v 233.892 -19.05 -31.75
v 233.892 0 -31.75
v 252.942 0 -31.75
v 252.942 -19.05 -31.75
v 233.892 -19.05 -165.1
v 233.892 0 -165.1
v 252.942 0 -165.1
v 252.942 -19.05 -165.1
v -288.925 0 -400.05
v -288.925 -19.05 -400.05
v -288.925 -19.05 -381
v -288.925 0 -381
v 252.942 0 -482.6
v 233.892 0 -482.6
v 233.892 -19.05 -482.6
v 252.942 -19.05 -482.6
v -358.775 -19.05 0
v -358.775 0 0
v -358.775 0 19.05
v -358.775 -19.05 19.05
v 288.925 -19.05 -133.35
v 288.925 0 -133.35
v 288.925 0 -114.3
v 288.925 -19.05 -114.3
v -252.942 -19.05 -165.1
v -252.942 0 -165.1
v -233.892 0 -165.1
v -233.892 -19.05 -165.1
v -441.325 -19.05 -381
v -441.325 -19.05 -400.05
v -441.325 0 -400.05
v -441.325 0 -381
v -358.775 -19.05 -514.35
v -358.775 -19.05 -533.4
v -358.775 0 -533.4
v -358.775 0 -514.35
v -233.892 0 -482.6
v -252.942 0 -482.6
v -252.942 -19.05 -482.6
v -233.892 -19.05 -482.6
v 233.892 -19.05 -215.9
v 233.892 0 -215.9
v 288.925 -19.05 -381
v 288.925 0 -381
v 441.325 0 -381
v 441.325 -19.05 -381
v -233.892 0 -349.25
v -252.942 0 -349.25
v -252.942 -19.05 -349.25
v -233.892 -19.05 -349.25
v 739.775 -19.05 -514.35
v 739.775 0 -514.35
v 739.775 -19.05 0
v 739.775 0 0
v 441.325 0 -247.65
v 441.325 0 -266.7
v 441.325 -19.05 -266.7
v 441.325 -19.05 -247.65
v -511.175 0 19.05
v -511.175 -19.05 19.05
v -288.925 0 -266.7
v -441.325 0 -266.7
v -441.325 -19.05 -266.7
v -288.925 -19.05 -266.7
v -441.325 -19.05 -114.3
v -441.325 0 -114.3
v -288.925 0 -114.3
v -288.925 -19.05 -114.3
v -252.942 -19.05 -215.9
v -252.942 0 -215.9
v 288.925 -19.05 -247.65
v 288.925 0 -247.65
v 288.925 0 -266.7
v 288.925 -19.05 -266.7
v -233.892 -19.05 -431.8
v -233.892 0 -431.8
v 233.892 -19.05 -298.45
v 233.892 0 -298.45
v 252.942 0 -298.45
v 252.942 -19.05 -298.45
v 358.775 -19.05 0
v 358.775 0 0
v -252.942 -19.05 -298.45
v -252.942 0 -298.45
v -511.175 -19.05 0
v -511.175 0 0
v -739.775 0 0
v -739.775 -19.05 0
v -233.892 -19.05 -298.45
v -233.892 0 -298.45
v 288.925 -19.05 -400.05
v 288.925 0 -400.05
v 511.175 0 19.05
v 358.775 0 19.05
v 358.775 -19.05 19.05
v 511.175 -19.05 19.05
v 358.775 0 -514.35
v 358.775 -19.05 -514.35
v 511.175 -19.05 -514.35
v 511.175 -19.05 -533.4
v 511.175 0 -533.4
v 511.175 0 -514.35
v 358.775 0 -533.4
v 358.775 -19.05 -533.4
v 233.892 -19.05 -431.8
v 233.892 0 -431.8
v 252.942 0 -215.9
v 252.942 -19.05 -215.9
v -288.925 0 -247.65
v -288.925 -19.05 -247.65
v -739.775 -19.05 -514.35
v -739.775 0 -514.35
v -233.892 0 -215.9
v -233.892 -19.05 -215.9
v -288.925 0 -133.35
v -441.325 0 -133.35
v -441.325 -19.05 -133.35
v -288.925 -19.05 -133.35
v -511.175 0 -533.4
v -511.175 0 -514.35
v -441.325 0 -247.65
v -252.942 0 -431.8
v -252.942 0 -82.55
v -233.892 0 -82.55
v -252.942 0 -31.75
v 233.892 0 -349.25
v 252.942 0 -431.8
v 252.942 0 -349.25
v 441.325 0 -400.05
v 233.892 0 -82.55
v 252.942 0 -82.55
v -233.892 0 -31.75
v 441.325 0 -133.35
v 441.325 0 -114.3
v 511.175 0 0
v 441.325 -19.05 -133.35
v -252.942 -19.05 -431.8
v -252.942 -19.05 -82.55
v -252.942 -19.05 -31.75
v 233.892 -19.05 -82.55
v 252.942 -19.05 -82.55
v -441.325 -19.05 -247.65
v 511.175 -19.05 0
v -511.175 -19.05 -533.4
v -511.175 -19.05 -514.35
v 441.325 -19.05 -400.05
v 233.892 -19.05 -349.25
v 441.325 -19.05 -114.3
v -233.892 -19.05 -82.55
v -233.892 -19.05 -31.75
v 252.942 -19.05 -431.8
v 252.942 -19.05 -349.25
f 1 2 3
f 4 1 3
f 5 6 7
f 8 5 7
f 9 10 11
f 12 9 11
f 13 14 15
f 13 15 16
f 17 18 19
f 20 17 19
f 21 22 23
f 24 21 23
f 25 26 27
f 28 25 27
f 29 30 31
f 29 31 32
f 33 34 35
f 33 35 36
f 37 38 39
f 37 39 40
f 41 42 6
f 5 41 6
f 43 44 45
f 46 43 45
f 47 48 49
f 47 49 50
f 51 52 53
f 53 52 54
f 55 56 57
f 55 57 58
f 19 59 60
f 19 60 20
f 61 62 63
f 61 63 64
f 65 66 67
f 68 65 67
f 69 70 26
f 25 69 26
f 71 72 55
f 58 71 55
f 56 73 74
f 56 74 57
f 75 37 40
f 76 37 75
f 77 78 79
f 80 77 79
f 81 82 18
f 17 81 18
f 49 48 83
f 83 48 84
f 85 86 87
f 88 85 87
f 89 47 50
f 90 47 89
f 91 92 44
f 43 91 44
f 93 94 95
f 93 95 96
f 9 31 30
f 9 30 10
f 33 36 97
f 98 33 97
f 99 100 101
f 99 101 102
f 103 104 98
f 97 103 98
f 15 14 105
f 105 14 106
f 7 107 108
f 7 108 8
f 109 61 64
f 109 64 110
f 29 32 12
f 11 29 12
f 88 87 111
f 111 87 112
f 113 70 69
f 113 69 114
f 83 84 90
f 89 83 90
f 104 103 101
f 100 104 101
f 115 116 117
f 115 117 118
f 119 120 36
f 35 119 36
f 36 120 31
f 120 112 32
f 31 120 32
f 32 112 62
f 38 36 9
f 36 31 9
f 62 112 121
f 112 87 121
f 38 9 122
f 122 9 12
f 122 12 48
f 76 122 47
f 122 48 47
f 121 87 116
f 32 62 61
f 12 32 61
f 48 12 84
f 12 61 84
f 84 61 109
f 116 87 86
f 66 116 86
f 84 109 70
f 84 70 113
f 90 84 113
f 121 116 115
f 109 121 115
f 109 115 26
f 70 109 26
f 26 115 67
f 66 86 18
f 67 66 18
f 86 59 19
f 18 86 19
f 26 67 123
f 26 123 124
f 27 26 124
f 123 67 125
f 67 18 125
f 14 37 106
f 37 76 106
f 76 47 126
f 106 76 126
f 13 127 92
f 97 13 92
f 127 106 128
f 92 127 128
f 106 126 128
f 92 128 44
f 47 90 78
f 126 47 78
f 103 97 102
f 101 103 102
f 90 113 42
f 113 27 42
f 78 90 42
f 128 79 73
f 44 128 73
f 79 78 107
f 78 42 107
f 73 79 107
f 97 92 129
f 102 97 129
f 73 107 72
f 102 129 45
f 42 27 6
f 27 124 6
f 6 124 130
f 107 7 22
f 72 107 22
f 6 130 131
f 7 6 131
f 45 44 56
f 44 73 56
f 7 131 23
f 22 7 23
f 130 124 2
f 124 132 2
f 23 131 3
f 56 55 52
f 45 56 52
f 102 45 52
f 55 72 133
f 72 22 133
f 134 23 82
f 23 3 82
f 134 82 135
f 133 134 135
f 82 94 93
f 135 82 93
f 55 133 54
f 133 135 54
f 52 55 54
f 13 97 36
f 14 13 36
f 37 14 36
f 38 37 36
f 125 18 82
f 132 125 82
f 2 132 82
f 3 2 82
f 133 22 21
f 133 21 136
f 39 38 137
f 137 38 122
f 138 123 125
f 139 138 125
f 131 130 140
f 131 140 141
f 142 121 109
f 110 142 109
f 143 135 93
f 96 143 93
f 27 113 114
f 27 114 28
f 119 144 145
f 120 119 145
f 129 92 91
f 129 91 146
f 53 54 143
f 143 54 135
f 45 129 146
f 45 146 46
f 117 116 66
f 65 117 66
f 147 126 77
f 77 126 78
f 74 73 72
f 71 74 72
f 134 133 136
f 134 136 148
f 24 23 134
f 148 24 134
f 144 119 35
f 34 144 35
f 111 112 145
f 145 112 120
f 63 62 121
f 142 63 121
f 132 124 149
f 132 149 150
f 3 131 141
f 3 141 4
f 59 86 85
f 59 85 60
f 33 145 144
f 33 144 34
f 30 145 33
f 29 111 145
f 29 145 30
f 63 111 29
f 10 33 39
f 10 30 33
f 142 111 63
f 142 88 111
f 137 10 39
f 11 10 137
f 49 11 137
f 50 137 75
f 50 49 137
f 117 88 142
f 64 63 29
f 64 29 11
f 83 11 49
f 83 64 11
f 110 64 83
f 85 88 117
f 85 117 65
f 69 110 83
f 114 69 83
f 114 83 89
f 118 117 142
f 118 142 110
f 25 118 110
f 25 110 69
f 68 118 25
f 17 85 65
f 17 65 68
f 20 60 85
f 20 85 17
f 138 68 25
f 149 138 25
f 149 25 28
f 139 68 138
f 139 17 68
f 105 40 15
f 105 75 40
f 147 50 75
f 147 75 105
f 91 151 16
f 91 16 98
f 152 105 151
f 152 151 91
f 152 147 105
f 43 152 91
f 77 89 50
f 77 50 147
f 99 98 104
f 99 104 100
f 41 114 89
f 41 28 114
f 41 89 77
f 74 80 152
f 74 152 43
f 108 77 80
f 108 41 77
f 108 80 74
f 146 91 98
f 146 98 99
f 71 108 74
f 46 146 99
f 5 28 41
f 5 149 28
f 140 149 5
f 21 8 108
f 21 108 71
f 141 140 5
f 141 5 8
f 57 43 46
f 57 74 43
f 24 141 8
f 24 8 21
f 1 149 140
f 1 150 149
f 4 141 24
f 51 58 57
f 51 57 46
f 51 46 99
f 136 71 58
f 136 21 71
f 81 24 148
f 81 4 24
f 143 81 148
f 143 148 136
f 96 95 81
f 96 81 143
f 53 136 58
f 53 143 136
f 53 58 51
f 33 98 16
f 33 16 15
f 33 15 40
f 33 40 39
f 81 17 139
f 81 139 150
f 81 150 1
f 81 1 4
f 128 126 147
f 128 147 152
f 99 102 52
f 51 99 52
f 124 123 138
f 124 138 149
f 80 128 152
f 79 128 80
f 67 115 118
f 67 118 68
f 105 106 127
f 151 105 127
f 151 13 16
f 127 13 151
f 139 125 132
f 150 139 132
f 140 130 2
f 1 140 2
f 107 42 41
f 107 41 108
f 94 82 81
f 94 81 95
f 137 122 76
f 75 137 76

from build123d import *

# Parameters (mm, degrees)
F0_W     = 19.05
F0_H     = 50.8
F0_W_2   = 152.4
F0_H_2   = 19.05
F0_H_3   = 19.0500013826
F1_DEPTH = 19.05


# Not quite as in the source:
# - a feature names something its author has since deleted; it is built from what else it names


with BuildPart() as f1:
    # F0 (on Front) → F1 (new body)
    with BuildSketch(Plane.XZ):
        Polygon((-511.175, 0), (-739.775, 0), (-739.775, -514.35), (-511.175, -514.35), (-358.775, -514.35), (358.775, -514.35), (511.175, -514.35), (739.775, -514.35), (739.775, 0), (511.175, 0), (358.775, 0), (-358.775, 0), align=None)
        with Locations((-243.4166649733, -457.2)):
            Rectangle(F0_W, F0_H, mode=Mode.SUBTRACT)
        with Locations((-365.125, -390.525)):
            Rectangle(F0_W_2, F0_H_2, mode=Mode.SUBTRACT)
        with Locations((-243.4166666497, -323.85)):
            Rectangle(F0_W, F0_H, mode=Mode.SUBTRACT)
        with Locations((-365.125, -257.175)):
            Rectangle(F0_W_2, F0_H_2, mode=Mode.SUBTRACT)
        with Locations((243.41666836, -457.2000013826)):
            Rectangle(F0_W, F0_H, mode=Mode.SUBTRACT)
        with Locations((365.125, -390.5250006913)):
            Rectangle(F0_W_2, F0_H_3, mode=Mode.SUBTRACT)
        with Locations((243.4166666836, -323.85)):
            Rectangle(F0_W, F0_H, mode=Mode.SUBTRACT)
        with Locations((365.125, -257.175)):
            Rectangle(F0_W_2, F0_H_2, mode=Mode.SUBTRACT)
        with Locations((-243.416666665, -190.5)):
            Rectangle(F0_W, F0_H, mode=Mode.SUBTRACT)
        with Locations((-365.125, -123.825)):
            Rectangle(F0_W_2, F0_H_2, mode=Mode.SUBTRACT)
        with Locations((-243.416666665, -57.15)):
            Rectangle(F0_W, F0_H, mode=Mode.SUBTRACT)
        with Locations((243.4166666684, -190.5)):
            Rectangle(F0_W, F0_H, mode=Mode.SUBTRACT)
        with Locations((365.125, -123.825)):
            Rectangle(F0_W_2, F0_H_2, mode=Mode.SUBTRACT)
        with Locations((243.4166666684, -57.15)):
            Rectangle(F0_W, F0_H, mode=Mode.SUBTRACT)
        with Locations((-434.975, 9.525)):
            Rectangle(F0_W_2, F0_H_2)
        with Locations((434.975, 9.525)):
            Rectangle(F0_W_2, F0_H_2)
        with Locations((-434.975, -523.875)):
            Rectangle(F0_W_2, F0_H_2)
        with Locations((434.975, -523.875)):
            Rectangle(F0_W_2, F0_H_2)
    extrude(amount=F1_DEPTH)


solid = f1.part
